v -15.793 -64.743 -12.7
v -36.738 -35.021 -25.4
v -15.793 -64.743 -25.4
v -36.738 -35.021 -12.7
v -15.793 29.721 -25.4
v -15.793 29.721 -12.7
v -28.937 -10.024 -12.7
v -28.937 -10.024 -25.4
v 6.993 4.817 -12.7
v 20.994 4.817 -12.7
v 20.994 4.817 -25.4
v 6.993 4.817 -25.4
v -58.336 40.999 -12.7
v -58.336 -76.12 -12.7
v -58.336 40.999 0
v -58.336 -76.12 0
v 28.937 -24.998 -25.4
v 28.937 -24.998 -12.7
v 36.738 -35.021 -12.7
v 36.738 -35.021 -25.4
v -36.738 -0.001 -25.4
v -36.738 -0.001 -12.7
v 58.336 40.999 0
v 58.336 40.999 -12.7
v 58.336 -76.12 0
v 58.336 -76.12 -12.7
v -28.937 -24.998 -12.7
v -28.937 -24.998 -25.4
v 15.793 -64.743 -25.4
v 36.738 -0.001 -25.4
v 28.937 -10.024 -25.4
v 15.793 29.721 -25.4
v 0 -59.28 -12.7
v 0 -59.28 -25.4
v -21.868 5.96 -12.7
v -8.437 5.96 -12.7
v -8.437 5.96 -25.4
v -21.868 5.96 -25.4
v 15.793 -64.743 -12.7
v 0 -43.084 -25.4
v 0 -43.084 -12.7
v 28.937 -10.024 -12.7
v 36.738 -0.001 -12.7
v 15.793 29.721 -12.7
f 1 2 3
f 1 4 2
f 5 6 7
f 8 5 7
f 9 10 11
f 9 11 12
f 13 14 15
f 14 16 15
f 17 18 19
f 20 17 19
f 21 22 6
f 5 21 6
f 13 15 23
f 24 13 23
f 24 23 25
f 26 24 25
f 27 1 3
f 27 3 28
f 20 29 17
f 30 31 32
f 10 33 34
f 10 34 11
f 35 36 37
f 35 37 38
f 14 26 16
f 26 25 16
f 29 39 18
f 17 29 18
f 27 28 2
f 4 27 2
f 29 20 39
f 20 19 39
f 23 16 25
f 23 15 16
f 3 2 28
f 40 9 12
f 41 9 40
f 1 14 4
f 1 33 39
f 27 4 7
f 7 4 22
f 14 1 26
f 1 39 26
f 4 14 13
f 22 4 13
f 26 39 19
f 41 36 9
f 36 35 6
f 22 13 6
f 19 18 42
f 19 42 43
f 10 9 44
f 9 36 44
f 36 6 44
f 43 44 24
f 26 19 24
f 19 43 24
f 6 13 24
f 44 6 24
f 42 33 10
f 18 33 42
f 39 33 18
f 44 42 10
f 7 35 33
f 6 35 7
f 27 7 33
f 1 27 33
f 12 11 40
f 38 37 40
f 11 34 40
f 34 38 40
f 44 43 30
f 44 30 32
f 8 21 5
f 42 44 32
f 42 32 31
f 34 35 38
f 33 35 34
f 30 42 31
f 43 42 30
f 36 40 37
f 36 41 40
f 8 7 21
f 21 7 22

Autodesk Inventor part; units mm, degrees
ref_plane "YZ Plane" through (0, 0, 0) normal (1, 0, 0) x (0, 1, 0)
ref_plane "XZ Plane" through (0, 0, 0) normal (0, 1, 0) x (-1, 0, 0)
ref_plane "XY Plane" through (0, 0, 0) normal (0, 0, 1) x (1, 0, 0)
sketch "Sketch4" plane through (0, 0, 0) normal (0, 0, 1) x (1, 0, 0)
  line L0 (-28.9374, -10.0235) -> (-36.7376, -0.0011)
  line L1 (-28.9374, -10.0235) -> (-16.2374, -10.0235) construction
  line L2 (-36.7376, -0.0011) -> (-15.7934, 29.7213)
  line L3 (-15.7934, 29.7213) -> (-28.9374, -10.0235)
  line L4 (0, 0) -> (0, 43.134) construction
  line L5 (0, -17.5109) -> (-45.4613, -17.5109) construction
  line L6 (-45.4613, -17.5109) -> (54.0034, -17.5109) construction
  line L7 (28.9374, -10.0235) -> (36.7376, -0.0011)
  line L8 (36.7376, -0.0011) -> (15.7934, 29.7213)
  line L9 (15.7934, 29.7213) -> (28.9374, -10.0235)
  line L10 (-28.9374, -24.9984) -> (-36.7376, -35.0207)
  line L11 (-36.7376, -35.0207) -> (-15.7934, -64.7432)
  line L12 (-15.7934, -64.7432) -> (-28.9374, -24.9984)
  line L13 (15.7934, -64.7432) -> (28.9374, -24.9984)
  line L14 (36.7376, -35.0207) -> (15.7934, -64.7432)
  line L15 (28.9374, -24.9984) -> (36.7376, -35.0207)
  dimension "d9" = 12.7
sketch "Sketch5" plane through (0, 0, 0) normal (0, 0, 1) x (1, 0, 0)
  line L0 (-58.3358, 40.999) -> (58.3358, 40.999)
  line L1 (58.3358, 40.999) -> (58.3358, -76.1205)
  line L2 (58.3358, -76.1205) -> (-58.3358, -76.1205)
  line L3 (-58.3358, -76.1205) -> (-58.3358, 40.999)
  line L4 (-58.3358, 40.999) -> (58.3358, -76.1205) construction
  line L5 (58.3358, 40.999) -> (-58.3358, -76.1205) construction
  point P0 (0, 0)
  point P1 (0, -17.5607)
extrude "Extrusion4" add sketch "Sketch4" against normal blind 25.4
extrude "Extrusion5" add sketch "Sketch5" against normal blind 12.7
sketch "Sketch6" plane through (0, 0, -12.7) normal (0, 0, -1) x (-1, 0, 0)
  line L0 (-23.8244, -6.5433) -> (-21.2379, -6.5433)
  line L1 (-20.9936, 4.8166) -> (-6.9933, 4.8166)
  line L2 (-6.9933, 4.8166) -> (0, -43.0842)
  line L3 (0, -43.0842) -> (8.4371, 5.9599)
  line L4 (8.4371, 5.9599) -> (21.8678, 5.9599)
  line L5 (21.8678, 5.9599) -> (0, -59.2796)
  line L6 (0, -59.2796) -> (-20.9936, 4.8166)
  point P0 (0, 0)
extrude "Extrusion6" add sketch "Sketch6" along normal blind 12.7
sketch "Sketch7" plane through (0, 0, -12.7) normal (0, 0, -1) x (-1, 0, 0)
  line L0 (-19.319, 35.5552) -> (28.0582, 35.5552) construction
  line L1 (28.0582, 35.5552) -> (28.0582, 31.6649) construction
  line L2 (28.0582, 31.6649) -> (-19.319, 31.6649) construction
  line L3 (-19.319, 31.6649) -> (-19.319, 35.5552) construction
  point P0 (0, 0)
properties part number "Logo"
